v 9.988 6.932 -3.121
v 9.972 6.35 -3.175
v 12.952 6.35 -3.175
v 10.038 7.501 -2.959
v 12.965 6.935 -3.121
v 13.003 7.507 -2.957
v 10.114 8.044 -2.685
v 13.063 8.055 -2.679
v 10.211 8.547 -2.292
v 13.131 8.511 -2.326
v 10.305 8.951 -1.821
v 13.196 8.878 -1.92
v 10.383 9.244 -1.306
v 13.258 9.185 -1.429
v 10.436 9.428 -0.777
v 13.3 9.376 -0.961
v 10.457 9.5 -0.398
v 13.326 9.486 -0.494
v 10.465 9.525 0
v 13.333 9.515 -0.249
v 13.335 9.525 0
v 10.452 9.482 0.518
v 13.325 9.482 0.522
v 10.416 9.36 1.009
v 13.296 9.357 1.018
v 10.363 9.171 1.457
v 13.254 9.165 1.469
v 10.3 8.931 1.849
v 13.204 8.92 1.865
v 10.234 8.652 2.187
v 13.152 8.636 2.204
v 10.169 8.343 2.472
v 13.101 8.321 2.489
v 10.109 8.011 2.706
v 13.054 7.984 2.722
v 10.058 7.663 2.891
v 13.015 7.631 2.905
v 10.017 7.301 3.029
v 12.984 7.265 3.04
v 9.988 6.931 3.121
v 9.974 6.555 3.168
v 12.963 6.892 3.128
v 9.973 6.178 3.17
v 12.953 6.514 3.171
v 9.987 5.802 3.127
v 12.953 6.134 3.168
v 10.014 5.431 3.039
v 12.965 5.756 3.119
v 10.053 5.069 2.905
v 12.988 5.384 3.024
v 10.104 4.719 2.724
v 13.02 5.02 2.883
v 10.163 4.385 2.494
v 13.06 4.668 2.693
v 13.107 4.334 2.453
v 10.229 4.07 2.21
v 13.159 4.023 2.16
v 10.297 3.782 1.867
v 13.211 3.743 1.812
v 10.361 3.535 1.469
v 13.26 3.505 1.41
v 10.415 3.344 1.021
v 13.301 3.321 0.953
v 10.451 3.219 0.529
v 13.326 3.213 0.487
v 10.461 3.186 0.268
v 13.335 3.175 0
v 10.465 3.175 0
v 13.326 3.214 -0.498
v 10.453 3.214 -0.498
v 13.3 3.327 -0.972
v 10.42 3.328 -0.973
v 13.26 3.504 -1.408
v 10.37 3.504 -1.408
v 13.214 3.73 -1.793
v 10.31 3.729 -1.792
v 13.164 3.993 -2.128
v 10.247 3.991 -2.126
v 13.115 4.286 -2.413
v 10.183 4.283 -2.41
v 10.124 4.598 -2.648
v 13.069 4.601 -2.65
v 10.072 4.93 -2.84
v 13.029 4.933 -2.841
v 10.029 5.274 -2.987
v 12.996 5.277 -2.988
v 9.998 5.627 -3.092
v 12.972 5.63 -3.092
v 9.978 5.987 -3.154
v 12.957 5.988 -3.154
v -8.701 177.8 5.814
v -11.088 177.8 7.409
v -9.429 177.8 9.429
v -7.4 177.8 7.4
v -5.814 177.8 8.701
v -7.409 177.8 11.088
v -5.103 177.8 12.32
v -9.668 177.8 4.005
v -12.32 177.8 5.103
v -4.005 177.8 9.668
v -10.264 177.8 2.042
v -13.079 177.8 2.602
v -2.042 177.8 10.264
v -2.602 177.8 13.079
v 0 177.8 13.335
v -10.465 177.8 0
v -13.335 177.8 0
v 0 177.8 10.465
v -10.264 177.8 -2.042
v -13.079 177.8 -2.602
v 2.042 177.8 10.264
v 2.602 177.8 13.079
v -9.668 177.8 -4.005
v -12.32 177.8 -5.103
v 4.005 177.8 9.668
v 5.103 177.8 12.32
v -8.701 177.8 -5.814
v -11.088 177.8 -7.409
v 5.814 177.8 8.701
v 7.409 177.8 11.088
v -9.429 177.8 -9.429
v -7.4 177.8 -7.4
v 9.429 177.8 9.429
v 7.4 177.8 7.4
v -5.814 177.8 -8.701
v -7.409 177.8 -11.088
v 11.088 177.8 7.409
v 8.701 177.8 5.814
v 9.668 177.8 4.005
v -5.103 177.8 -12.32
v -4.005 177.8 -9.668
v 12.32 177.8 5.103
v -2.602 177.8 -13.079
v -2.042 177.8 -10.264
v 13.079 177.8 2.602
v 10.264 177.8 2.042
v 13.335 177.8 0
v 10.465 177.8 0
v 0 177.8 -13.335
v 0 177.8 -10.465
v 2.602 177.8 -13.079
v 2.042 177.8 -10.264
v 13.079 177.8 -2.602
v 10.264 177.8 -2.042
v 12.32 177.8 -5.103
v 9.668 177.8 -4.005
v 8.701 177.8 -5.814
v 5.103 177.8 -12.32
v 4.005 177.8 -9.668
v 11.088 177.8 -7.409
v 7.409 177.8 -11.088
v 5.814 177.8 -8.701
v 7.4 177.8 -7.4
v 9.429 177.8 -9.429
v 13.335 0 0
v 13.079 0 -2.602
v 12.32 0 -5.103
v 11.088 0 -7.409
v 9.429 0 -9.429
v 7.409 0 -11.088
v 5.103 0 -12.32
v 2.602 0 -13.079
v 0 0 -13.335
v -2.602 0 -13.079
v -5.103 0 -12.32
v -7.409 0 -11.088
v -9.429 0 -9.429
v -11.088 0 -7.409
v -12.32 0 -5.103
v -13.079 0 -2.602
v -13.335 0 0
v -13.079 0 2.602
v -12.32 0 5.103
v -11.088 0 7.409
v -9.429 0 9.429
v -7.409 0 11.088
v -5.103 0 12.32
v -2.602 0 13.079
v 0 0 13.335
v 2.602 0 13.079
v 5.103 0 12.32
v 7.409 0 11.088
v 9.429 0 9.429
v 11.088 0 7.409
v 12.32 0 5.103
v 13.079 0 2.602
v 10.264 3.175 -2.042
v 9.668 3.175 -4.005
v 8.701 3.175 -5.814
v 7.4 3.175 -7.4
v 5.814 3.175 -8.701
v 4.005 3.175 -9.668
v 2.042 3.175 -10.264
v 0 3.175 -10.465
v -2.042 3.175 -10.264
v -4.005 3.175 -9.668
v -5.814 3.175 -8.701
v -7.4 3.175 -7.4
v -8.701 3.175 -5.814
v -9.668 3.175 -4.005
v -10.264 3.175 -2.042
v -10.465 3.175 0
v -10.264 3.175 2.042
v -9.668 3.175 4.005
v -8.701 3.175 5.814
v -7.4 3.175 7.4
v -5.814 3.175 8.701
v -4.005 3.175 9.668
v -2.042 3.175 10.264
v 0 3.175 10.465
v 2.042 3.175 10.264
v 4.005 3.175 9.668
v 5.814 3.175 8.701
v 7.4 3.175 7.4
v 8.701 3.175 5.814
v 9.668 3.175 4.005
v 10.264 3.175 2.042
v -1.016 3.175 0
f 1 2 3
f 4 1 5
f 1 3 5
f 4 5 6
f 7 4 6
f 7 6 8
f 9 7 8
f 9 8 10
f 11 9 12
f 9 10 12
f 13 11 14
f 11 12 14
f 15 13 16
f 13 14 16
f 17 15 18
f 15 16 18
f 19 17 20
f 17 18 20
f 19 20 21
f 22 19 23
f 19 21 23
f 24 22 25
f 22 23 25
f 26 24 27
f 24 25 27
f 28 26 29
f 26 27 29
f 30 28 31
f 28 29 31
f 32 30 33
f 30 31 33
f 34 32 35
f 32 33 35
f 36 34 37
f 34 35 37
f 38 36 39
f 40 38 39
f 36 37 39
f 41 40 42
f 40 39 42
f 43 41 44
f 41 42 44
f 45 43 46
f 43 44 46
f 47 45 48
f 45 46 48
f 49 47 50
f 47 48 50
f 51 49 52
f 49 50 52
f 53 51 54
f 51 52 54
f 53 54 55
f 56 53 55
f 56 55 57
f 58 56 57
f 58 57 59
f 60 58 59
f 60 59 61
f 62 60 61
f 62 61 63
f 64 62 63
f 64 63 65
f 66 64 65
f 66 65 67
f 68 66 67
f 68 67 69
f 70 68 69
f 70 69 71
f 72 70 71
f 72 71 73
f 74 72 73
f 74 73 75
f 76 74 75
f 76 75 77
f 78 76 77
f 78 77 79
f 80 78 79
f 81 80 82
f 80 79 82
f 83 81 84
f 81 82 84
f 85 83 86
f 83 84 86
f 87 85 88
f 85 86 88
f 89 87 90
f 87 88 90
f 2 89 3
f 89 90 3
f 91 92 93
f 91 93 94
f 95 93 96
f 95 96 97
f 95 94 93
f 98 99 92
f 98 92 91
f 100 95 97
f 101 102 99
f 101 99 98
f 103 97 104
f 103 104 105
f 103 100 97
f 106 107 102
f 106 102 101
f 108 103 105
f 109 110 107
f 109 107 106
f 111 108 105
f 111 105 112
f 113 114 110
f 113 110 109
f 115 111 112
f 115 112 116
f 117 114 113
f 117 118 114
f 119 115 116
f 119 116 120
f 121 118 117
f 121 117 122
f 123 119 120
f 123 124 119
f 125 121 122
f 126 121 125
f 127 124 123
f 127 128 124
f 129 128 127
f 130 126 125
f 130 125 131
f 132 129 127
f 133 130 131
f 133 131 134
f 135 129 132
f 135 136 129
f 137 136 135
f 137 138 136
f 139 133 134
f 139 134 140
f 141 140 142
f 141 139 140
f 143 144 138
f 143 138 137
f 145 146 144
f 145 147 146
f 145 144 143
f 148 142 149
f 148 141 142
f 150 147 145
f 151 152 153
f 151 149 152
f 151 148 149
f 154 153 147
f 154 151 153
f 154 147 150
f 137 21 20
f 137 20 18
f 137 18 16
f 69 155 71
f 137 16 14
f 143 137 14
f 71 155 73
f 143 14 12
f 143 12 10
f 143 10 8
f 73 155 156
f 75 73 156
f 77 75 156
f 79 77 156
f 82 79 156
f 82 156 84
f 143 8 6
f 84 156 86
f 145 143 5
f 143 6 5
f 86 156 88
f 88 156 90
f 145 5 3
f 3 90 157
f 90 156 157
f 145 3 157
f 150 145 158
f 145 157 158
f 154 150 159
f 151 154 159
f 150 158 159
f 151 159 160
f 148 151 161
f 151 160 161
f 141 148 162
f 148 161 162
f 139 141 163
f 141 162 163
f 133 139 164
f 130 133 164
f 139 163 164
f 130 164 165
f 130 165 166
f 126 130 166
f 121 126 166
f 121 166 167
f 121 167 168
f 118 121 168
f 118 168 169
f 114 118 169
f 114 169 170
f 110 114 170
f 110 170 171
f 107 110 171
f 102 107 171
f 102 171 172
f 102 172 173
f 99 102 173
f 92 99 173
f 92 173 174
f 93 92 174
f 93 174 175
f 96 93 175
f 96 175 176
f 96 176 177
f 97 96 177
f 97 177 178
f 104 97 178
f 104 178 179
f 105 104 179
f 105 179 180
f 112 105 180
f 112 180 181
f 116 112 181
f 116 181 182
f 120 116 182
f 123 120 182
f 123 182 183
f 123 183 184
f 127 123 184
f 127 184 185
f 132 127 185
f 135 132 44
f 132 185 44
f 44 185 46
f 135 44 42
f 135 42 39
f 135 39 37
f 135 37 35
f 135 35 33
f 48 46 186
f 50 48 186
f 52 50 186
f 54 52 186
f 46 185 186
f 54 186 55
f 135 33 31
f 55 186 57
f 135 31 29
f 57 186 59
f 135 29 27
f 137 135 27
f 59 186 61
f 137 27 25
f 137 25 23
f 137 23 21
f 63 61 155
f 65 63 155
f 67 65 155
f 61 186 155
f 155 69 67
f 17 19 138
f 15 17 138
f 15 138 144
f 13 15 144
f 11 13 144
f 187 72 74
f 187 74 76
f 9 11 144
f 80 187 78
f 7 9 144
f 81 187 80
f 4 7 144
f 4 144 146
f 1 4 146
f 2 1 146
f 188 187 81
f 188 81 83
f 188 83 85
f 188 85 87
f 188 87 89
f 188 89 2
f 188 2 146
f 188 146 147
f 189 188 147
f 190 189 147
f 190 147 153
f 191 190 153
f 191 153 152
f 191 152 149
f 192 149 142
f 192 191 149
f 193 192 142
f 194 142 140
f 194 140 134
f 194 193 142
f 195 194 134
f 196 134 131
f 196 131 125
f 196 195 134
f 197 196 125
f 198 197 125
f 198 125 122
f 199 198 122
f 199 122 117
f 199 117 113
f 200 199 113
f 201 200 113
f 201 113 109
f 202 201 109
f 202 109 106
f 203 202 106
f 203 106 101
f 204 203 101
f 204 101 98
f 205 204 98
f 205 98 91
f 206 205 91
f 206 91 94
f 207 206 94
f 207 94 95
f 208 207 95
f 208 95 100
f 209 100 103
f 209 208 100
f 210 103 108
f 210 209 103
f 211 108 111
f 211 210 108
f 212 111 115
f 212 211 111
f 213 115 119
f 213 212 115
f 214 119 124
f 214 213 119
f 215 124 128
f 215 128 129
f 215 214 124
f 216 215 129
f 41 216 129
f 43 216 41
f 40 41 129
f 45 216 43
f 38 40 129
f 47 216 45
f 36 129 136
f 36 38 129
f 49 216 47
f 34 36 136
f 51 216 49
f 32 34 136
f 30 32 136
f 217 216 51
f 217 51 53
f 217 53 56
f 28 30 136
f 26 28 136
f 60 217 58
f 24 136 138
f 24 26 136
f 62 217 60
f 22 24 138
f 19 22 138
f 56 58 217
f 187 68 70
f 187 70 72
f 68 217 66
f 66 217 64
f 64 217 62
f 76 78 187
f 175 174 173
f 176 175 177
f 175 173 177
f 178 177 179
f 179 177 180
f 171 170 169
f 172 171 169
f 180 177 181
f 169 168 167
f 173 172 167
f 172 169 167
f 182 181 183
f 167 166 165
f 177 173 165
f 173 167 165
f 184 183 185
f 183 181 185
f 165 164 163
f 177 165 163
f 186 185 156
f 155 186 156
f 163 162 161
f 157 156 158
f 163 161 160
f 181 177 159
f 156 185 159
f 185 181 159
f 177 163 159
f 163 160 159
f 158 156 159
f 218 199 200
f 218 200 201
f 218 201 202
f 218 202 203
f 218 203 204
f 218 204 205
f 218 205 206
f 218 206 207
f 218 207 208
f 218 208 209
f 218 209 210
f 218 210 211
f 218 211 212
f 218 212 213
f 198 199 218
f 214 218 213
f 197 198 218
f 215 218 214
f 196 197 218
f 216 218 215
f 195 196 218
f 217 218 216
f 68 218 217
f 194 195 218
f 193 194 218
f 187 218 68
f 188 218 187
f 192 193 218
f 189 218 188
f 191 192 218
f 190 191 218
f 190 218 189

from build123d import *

# Parameters (mm, degrees)
SKETCH1_R           = 13.335
SKETCH1_R_2         = 10.4648
BOSS_EXTRUDE1_DEPTH = 177.8
SKETCH1_2_R         = 10.4648
BOSS_EXTRUDE2_DEPTH = 3.175
SKETCH3_R           = 3.175
CUT_EXTRUDE1_DEPTH  = 14.351


with BuildPart() as part:
    # Sketch1 → Boss-Extrude1 (new body)
    with BuildSketch(Plane(origin=(0, 0, 0), x_dir=(1, 0, 0), z_dir=(0, 1, 0))):
        Circle(SKETCH1_R)
        Circle(SKETCH1_R_2, mode=Mode.SUBTRACT)
    extrude(amount=BOSS_EXTRUDE1_DEPTH)

    # Sketch1<2> → Boss-Extrude2 (add)
    with BuildSketch(Plane(origin=(0, 0, 0), x_dir=(1, 0, 0), z_dir=(0, 1, 0))):
        Circle(SKETCH1_2_R)
    extrude(amount=BOSS_EXTRUDE2_DEPTH)

    # Sketch3 → Cut-Extrude1 (cut)
    with BuildSketch(Plane(origin=(13.335, 0, 0), x_dir=(0, 0, -1), z_dir=(1, 0, 0))):
        with Locations((0, 6.35)):
            Circle(SKETCH3_R)
    extrude(amount=-CUT_EXTRUDE1_DEPTH, mode=Mode.SUBTRACT)


solid = part.part
